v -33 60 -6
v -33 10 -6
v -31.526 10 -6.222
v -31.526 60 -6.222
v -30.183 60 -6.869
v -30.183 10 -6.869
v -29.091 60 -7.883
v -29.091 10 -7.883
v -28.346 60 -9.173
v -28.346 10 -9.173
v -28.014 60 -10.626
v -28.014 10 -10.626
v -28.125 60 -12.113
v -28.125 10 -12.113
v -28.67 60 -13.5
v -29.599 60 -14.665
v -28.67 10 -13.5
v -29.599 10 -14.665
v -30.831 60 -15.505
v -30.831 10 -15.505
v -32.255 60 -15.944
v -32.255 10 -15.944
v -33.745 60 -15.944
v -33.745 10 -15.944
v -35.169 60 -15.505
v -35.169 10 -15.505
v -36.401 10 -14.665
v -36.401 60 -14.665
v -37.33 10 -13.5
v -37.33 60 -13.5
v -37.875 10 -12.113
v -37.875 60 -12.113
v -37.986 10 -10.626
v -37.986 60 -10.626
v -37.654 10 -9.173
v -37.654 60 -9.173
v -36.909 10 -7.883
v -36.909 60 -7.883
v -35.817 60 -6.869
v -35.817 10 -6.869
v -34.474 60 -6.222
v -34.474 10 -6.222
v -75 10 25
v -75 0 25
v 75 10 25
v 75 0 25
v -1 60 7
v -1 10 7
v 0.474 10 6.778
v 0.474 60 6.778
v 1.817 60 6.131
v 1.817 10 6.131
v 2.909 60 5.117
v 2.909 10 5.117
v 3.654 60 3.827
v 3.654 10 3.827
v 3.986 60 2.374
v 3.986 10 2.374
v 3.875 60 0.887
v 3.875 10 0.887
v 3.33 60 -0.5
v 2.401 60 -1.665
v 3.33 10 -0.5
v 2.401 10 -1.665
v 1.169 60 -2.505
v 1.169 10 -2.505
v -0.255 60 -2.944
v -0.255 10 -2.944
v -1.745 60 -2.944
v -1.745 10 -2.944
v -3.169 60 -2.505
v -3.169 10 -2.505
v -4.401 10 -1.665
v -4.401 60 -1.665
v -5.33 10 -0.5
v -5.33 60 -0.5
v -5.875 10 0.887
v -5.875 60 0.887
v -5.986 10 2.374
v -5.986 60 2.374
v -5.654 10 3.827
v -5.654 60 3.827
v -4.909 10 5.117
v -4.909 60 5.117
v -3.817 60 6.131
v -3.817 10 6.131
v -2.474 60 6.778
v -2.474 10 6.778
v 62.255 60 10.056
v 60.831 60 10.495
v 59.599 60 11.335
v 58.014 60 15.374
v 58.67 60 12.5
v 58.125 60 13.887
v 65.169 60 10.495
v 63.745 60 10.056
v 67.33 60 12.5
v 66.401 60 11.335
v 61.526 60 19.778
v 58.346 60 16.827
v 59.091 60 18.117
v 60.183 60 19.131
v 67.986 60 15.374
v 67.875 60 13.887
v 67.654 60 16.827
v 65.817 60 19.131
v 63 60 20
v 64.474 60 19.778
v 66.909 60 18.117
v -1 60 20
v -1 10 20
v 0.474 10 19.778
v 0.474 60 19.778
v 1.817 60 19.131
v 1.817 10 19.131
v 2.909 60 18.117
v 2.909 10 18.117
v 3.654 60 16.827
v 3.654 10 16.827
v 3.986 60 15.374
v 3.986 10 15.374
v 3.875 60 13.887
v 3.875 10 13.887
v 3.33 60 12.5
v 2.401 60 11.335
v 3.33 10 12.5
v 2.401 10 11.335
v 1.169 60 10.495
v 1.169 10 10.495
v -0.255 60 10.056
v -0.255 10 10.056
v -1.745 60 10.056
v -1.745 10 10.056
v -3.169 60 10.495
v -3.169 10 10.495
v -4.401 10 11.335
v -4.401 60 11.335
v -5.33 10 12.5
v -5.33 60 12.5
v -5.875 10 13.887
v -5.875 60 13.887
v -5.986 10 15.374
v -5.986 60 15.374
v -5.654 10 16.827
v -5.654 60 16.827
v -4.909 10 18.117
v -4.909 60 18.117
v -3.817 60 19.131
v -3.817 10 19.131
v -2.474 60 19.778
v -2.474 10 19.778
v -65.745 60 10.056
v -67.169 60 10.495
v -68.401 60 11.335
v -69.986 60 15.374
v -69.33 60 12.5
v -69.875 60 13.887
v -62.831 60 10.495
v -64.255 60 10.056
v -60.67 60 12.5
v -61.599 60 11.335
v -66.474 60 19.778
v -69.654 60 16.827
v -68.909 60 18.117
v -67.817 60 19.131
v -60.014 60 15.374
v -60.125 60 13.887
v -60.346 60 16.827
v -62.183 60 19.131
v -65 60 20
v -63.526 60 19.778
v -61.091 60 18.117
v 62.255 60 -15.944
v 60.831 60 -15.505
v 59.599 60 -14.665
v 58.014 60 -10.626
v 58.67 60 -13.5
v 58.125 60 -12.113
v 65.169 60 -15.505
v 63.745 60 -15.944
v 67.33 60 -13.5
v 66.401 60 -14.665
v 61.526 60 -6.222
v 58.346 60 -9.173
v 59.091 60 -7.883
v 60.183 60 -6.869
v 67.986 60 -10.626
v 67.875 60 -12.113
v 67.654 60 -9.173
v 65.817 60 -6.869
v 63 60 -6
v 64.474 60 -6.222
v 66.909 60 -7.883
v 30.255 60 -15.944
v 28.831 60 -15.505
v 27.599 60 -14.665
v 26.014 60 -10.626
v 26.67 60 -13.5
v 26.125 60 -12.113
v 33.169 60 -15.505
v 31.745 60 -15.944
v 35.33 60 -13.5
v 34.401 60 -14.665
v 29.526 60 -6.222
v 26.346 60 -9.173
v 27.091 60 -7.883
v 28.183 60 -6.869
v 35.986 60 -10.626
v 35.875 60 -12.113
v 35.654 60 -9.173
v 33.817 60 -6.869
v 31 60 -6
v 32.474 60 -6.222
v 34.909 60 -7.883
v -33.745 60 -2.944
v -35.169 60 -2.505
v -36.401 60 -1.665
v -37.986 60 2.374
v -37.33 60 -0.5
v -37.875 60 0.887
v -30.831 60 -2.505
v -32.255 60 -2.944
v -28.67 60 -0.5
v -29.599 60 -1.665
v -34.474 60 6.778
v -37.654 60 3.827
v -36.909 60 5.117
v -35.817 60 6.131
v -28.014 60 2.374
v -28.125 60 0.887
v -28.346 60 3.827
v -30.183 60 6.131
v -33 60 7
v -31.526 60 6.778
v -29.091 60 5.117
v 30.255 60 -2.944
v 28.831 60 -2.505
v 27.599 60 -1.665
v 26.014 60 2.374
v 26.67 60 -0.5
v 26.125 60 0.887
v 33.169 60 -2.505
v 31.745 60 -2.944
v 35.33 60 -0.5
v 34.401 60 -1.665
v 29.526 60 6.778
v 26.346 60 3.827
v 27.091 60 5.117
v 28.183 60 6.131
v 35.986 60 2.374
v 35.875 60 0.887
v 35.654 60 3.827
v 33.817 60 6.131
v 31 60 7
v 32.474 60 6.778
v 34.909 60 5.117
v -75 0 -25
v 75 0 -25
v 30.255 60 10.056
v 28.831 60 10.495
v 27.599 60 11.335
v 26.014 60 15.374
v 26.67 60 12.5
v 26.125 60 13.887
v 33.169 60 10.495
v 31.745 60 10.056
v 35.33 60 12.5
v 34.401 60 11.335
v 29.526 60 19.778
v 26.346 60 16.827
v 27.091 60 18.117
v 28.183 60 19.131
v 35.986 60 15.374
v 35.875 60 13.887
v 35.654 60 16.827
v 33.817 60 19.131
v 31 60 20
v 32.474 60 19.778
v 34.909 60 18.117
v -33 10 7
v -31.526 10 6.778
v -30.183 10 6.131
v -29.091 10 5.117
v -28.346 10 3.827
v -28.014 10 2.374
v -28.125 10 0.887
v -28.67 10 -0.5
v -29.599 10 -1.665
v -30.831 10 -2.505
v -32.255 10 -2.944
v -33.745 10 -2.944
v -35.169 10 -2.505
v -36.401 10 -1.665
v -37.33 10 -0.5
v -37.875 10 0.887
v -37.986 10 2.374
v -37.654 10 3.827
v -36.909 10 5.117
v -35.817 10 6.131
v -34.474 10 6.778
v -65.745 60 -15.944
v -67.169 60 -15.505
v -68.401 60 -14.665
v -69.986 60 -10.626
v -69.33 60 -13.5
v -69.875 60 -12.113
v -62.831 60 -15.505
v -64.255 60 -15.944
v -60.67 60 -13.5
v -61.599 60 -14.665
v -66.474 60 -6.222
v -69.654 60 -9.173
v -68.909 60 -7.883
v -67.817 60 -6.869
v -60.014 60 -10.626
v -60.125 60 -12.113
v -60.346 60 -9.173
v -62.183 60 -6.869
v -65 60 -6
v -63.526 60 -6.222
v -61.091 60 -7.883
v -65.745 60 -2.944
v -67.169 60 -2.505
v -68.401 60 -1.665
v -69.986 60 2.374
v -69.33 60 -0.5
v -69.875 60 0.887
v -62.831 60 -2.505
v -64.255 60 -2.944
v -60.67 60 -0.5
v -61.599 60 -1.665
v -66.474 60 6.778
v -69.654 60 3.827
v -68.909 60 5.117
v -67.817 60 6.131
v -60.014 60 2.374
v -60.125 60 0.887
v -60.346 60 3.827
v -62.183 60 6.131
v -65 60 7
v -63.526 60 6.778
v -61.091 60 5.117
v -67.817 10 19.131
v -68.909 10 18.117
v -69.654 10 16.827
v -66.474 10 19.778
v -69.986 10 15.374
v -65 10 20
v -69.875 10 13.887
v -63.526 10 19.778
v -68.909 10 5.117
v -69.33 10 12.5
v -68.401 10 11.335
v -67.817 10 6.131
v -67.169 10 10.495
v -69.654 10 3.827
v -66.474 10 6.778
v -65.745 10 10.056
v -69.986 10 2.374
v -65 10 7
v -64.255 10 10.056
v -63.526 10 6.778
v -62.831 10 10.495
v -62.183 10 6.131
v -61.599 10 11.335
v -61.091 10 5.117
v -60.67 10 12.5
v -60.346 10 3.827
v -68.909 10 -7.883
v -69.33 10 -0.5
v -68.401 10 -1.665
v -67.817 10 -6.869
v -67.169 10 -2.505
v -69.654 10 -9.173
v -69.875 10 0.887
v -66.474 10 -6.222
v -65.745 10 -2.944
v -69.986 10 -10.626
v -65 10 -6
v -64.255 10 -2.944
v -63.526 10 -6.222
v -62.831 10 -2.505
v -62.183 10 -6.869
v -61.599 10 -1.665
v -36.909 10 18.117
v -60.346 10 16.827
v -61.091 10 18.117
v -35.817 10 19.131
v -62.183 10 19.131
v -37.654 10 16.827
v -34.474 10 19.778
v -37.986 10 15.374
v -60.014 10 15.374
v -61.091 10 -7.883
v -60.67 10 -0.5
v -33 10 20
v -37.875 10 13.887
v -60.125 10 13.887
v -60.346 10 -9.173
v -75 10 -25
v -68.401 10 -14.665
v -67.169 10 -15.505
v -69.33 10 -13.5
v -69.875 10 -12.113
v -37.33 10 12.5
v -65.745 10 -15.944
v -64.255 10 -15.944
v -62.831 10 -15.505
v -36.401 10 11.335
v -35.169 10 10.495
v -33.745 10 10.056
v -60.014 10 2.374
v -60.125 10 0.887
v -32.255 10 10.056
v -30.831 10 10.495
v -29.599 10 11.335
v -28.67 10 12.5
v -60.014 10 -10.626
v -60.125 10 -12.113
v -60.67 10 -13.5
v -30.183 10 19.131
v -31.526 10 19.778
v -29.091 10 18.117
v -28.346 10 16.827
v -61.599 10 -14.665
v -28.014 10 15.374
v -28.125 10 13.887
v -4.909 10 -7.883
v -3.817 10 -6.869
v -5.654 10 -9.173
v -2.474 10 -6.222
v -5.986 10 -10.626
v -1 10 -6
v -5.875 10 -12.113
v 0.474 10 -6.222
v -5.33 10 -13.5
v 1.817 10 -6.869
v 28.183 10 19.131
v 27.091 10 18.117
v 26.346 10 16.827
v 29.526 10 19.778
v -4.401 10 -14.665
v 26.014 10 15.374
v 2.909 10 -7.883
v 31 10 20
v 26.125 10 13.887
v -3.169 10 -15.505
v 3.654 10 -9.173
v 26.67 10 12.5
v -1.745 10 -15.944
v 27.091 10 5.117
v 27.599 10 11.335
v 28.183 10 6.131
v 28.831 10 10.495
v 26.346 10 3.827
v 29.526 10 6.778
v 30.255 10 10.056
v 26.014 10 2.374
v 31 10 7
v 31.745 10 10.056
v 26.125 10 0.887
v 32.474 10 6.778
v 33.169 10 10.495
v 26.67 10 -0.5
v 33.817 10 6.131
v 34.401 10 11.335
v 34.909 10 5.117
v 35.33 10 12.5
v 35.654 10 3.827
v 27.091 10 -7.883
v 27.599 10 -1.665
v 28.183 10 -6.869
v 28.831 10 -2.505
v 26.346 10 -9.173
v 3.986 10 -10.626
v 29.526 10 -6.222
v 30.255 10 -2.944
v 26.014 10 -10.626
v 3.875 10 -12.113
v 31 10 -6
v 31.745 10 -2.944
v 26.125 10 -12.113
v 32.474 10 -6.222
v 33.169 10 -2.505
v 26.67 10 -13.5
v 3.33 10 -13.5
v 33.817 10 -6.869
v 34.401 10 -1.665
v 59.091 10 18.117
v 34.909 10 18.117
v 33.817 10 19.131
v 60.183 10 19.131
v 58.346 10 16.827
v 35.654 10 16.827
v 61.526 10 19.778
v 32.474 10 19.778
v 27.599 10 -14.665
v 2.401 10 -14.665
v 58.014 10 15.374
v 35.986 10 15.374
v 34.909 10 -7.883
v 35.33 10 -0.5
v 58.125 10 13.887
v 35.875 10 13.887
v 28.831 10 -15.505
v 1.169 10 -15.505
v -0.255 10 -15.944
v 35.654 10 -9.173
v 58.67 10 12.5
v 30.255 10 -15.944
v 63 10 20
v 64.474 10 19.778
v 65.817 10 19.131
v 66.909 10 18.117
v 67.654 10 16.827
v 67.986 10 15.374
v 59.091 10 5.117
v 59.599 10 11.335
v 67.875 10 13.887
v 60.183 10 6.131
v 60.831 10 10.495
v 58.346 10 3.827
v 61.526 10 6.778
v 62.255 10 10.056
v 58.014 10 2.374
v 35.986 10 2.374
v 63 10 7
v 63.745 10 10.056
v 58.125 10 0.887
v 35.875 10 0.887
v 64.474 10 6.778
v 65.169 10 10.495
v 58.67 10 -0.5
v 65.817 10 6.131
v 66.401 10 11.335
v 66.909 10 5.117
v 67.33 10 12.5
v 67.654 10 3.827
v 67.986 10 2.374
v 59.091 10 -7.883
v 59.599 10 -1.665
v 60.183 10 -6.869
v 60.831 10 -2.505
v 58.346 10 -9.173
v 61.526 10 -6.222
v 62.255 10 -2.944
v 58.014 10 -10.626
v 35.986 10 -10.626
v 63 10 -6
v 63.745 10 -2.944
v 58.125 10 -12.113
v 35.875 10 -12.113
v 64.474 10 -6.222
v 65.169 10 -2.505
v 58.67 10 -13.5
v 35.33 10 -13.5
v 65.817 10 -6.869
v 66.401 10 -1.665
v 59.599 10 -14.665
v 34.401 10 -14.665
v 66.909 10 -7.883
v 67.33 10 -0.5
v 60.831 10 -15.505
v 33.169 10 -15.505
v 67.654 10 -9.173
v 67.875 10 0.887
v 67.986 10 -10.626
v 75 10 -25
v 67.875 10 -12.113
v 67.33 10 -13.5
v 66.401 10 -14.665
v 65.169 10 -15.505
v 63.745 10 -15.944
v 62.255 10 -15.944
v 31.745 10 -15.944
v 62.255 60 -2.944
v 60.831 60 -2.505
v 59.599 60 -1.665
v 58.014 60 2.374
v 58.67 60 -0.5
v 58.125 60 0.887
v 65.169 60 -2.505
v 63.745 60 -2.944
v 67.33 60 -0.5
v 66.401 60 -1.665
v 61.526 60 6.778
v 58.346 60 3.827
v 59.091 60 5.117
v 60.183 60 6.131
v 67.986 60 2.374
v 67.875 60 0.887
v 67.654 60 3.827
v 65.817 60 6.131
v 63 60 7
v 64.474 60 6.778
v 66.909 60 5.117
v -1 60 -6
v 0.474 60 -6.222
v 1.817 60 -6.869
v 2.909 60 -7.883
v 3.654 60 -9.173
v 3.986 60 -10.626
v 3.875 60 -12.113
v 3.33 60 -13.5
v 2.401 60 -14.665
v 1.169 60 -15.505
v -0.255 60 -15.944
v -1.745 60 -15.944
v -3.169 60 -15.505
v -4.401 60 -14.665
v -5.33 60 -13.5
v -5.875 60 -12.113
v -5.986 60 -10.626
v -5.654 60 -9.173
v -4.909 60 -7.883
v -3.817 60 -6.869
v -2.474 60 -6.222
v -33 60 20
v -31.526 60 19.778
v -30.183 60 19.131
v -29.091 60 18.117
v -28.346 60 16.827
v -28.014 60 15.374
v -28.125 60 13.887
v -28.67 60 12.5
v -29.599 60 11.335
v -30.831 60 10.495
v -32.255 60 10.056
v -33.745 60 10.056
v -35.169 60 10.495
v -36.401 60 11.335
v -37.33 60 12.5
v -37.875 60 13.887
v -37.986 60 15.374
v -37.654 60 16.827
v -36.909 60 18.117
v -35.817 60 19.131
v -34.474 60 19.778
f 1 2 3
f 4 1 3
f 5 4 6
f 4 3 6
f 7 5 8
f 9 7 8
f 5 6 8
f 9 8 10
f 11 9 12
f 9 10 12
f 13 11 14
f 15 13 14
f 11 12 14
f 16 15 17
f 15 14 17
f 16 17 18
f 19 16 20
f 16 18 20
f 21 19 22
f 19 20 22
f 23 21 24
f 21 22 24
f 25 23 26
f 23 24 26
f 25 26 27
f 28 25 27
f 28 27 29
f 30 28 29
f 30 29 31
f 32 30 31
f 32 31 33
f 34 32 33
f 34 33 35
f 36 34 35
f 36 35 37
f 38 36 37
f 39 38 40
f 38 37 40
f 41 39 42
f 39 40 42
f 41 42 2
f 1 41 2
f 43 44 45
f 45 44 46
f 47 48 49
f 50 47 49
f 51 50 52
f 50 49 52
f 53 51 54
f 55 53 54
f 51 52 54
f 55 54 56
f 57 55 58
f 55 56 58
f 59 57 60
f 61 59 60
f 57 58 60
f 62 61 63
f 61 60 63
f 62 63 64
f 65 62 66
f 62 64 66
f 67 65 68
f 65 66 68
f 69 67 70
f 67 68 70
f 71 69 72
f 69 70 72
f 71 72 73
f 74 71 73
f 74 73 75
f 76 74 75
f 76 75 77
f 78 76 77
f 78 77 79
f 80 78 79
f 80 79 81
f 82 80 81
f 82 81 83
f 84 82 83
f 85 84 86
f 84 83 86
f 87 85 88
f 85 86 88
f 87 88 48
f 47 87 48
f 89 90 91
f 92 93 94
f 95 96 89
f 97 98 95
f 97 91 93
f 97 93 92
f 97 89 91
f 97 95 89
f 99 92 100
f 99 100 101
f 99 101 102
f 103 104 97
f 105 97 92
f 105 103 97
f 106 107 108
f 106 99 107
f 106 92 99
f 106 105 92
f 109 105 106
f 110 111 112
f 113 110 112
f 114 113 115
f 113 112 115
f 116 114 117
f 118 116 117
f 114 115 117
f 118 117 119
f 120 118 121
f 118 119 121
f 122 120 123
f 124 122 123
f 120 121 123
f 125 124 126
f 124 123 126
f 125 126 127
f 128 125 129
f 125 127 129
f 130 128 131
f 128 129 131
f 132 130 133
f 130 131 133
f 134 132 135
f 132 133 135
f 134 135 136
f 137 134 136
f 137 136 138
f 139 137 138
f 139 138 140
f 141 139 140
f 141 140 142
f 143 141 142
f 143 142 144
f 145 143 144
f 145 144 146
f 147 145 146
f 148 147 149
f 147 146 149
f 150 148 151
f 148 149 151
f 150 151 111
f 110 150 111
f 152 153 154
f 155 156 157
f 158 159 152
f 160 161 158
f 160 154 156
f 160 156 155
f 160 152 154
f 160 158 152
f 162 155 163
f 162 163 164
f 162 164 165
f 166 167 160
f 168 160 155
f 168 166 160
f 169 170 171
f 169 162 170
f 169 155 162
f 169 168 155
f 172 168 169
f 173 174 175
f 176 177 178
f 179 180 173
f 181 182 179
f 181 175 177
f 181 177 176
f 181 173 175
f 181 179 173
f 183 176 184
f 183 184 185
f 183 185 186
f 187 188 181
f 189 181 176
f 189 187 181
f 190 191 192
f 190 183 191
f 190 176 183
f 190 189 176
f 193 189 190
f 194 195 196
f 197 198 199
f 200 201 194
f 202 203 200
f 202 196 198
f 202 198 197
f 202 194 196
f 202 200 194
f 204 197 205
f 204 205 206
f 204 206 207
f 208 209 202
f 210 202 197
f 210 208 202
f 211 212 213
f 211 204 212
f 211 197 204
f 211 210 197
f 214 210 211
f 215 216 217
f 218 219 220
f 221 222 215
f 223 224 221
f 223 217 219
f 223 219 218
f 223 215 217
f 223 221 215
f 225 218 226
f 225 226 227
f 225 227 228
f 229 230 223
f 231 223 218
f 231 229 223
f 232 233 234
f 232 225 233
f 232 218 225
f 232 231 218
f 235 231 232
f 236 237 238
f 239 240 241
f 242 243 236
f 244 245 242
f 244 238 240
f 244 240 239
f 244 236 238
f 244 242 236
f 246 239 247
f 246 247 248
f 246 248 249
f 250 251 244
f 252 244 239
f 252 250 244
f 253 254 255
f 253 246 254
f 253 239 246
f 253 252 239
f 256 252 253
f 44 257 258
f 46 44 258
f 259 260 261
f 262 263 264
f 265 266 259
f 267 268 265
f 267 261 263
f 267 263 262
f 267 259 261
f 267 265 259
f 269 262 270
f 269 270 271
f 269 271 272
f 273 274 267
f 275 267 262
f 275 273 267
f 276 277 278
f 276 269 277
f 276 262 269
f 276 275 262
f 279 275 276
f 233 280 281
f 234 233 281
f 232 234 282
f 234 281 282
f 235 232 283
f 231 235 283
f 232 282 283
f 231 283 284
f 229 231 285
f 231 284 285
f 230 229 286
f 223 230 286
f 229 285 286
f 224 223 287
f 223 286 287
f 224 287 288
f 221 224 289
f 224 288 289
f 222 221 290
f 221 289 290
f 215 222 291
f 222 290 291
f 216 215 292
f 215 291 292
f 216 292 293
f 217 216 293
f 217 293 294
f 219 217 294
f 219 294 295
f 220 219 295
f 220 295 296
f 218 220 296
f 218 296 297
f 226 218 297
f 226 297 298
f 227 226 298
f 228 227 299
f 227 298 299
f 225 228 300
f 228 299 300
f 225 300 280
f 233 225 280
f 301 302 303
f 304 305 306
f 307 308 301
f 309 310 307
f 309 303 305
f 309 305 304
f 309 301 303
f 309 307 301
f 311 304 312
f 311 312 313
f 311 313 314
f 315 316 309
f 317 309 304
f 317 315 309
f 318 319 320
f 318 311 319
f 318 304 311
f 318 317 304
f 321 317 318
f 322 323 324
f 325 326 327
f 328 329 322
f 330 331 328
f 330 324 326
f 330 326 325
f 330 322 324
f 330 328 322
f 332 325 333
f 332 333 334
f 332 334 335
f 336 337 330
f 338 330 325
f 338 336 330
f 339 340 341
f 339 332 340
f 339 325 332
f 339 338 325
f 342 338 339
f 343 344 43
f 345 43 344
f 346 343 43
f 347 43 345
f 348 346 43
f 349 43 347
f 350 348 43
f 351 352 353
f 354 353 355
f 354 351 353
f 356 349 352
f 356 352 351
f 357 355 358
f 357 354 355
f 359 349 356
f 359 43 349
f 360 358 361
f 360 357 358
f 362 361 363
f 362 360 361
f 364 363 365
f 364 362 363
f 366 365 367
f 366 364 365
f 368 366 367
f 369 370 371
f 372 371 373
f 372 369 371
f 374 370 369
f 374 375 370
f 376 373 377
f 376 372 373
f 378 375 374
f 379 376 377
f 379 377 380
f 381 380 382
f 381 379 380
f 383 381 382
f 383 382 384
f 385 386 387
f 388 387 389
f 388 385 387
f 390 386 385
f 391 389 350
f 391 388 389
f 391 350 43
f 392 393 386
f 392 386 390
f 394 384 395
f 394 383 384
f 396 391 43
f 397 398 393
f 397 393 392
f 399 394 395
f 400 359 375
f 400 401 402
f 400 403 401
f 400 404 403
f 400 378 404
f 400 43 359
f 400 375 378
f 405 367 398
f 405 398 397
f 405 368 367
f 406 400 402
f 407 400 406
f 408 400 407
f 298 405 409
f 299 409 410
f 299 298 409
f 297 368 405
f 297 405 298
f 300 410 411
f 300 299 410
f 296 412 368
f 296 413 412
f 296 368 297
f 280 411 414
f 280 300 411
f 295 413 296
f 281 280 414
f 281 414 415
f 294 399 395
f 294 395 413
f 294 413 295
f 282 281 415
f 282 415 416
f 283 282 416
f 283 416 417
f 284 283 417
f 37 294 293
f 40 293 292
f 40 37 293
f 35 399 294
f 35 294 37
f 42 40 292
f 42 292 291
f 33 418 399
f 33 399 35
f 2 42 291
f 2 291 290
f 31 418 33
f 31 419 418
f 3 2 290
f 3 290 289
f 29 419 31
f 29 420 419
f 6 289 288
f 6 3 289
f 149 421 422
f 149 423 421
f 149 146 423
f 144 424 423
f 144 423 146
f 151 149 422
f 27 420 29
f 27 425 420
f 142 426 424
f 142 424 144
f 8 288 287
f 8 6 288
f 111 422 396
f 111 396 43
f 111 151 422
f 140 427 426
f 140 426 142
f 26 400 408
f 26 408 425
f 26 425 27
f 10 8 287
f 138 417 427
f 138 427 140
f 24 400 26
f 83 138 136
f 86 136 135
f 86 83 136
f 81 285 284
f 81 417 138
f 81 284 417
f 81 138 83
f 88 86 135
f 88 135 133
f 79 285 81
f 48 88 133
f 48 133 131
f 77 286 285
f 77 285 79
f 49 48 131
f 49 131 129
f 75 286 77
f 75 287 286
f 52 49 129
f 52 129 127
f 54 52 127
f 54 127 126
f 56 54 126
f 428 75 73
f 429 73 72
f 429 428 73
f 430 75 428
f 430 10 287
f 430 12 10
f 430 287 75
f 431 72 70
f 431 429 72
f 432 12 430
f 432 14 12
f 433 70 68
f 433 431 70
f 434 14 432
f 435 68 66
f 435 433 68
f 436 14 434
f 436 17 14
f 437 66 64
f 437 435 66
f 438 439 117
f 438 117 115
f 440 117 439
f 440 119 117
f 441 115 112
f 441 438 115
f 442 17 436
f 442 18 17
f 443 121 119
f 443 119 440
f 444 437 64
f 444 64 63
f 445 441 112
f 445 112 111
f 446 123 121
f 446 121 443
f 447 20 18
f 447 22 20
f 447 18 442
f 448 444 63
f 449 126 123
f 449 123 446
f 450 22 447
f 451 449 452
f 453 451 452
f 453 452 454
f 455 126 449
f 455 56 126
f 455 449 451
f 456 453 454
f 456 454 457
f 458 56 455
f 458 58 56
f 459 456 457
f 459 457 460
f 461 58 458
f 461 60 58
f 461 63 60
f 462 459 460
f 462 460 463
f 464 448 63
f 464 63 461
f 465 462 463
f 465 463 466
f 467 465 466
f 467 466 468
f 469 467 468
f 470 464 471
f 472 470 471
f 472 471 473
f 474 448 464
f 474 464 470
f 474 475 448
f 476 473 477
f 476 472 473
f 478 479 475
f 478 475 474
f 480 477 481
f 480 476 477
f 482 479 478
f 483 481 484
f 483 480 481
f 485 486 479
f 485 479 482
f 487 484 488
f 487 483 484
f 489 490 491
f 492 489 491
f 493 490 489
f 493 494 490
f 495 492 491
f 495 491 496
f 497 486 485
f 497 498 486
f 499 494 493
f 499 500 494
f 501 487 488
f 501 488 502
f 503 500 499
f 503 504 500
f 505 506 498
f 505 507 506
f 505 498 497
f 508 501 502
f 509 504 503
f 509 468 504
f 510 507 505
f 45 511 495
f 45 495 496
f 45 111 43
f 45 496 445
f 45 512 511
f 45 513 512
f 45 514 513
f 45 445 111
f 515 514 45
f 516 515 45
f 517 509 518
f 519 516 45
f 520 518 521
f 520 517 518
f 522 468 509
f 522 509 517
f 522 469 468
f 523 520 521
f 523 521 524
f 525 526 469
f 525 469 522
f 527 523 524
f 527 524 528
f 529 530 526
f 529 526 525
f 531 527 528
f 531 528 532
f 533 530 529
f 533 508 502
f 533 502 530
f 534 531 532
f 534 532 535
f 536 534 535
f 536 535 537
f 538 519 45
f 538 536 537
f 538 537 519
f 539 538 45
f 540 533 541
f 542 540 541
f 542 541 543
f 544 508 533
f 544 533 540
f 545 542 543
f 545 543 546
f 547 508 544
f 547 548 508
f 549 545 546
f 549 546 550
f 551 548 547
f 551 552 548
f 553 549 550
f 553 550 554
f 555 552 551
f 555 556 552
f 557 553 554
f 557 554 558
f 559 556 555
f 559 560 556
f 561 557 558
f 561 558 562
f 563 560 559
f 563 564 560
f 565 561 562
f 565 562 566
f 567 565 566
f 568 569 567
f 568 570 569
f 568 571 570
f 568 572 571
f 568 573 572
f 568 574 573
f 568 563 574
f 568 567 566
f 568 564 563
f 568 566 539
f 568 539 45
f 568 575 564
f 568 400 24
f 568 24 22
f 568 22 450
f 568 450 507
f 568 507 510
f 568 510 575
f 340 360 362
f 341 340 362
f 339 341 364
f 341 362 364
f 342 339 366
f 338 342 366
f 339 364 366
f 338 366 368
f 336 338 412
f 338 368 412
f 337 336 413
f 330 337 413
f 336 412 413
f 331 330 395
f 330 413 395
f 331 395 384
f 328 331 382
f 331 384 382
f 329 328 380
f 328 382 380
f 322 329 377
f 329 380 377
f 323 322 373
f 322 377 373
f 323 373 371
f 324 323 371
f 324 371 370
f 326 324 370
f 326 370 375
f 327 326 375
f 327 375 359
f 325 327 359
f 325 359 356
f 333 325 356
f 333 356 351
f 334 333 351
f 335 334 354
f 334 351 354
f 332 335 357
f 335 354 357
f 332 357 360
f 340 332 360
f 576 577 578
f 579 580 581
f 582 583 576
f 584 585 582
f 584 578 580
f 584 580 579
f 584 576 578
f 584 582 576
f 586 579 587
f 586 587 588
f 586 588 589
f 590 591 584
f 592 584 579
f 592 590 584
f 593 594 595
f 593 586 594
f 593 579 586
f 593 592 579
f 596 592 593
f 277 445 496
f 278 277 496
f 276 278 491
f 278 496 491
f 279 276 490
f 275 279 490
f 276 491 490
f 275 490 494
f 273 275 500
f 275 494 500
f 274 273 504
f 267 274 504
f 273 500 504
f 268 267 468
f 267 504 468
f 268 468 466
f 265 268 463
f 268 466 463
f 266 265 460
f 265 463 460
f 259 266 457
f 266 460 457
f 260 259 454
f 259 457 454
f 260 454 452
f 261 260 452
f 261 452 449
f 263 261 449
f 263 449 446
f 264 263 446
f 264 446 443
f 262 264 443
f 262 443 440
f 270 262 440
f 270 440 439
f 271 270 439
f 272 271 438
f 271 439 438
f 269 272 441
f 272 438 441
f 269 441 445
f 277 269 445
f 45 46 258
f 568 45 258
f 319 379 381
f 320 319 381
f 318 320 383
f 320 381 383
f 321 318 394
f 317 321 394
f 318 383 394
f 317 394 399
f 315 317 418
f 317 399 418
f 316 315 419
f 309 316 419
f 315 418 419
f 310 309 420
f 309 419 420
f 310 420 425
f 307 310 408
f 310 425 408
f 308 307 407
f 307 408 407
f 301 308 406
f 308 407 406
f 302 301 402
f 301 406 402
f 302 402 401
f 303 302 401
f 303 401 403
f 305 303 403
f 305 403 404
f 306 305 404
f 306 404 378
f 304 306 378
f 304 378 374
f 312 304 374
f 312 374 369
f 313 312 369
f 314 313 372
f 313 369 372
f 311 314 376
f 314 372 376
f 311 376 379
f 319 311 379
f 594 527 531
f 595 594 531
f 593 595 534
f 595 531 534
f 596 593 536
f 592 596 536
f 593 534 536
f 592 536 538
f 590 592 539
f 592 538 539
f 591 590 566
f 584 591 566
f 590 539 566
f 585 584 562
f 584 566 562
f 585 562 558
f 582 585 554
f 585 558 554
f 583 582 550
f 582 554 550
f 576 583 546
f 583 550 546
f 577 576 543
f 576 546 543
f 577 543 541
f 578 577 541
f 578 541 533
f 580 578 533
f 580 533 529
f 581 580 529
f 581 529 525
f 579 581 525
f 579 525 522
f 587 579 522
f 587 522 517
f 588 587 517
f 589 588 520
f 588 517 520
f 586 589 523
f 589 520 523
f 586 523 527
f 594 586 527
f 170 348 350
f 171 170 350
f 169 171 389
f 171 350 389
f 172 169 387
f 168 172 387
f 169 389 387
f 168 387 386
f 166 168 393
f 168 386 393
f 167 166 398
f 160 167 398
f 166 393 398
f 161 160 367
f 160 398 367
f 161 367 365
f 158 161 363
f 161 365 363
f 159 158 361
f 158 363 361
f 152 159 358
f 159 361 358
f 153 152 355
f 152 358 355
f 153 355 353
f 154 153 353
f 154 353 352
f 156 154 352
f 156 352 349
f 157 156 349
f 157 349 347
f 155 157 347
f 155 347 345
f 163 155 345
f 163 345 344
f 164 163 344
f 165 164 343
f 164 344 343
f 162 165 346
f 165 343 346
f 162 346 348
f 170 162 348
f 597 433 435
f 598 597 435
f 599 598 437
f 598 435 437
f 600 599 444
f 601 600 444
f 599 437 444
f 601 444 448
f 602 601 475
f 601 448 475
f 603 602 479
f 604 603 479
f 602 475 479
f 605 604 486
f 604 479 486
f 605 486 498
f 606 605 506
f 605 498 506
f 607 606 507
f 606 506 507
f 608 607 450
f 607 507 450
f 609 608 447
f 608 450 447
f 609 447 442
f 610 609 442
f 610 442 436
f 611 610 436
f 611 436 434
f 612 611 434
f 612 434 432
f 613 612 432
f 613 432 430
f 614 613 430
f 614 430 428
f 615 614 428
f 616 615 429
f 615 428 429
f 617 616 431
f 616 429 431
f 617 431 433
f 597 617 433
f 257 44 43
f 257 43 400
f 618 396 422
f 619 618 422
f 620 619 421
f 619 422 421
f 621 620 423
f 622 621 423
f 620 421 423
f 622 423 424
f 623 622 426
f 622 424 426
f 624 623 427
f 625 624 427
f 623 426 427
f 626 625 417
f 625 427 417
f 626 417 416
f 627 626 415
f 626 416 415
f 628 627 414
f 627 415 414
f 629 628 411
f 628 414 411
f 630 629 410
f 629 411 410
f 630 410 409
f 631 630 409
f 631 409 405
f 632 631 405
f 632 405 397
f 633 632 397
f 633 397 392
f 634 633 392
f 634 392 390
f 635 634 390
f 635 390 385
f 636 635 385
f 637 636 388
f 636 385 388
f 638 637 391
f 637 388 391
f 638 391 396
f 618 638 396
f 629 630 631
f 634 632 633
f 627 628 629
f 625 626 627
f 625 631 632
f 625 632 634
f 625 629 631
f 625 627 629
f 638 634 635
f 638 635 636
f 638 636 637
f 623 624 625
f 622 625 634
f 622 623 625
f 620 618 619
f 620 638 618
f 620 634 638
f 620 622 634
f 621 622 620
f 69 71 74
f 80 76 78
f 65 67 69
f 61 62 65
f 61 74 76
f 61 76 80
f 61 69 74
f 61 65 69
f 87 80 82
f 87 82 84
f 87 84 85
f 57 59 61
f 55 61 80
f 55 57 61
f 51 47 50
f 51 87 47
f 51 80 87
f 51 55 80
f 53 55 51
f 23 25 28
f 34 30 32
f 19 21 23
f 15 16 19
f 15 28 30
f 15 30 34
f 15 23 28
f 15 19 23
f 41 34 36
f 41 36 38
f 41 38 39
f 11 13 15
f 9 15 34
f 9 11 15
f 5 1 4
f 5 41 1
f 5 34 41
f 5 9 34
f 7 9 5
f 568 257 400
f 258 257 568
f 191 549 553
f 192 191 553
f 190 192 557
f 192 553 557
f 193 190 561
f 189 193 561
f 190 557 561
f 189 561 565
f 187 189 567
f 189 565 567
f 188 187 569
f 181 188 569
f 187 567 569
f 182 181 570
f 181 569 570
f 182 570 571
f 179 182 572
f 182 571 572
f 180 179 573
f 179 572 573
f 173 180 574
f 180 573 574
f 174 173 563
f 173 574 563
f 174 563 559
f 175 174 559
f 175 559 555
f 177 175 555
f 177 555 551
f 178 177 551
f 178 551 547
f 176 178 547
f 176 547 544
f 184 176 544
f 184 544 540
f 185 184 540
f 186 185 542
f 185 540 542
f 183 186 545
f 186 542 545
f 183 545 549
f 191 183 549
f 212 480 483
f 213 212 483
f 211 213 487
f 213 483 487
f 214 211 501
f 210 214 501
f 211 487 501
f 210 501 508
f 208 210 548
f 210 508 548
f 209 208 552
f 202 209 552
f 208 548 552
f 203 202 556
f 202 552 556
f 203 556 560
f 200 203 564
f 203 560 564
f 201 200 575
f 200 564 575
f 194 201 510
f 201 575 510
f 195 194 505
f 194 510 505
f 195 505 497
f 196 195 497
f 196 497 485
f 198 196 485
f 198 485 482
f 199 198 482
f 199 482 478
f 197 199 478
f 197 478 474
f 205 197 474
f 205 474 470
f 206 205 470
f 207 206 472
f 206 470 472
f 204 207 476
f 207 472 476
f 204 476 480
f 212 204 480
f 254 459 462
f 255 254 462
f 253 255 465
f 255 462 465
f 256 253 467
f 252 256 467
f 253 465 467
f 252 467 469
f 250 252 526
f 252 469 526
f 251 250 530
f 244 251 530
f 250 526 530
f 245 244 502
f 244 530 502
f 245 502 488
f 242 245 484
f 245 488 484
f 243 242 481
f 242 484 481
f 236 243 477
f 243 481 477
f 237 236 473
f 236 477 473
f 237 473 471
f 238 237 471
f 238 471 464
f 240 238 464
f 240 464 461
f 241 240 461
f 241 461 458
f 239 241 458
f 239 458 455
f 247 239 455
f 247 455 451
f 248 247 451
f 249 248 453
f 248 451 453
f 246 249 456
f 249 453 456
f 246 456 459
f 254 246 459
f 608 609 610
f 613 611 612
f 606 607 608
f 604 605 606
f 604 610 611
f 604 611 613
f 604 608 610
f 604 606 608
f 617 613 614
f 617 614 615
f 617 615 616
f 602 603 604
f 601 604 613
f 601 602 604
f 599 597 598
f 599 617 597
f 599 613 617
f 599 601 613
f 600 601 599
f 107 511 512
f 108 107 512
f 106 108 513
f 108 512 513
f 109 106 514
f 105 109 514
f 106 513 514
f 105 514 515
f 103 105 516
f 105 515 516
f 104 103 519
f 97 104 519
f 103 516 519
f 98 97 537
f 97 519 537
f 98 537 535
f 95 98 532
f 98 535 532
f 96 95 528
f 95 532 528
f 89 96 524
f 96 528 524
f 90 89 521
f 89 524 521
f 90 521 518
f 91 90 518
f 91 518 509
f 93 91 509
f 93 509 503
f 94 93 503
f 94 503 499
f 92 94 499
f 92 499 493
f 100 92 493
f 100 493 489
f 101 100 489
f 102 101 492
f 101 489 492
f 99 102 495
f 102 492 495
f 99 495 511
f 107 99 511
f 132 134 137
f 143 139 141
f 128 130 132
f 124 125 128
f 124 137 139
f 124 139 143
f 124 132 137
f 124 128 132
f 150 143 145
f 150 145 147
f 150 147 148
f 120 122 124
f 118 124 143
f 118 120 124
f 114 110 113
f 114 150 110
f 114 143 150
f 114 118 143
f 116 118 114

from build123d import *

# Parameters (mm, degrees)
ESQUISSE1_W                     = 150
ESQUISSE1_H                     = 50
BOSS_EXTRU_1_DEPTH              = 10
ESQUISSE2_R                     = 5
BOSS_EXTRU_2_DEPTH              = 50
R_P_TITION_LIN_AIRE1_COUNT      = 5
R_P_TITION_LIN_AIRE1_PITCH      = 32
R_P_TITION_LIN_AIRE1_COUNT_DIR2 = 3
R_P_TITION_LIN_AIRE1_PITCH_DIR2 = 13


with BuildPart() as part:
    # Esquisse1 → Boss.-Extru.1 (new body)
    with BuildSketch(Plane(origin=(0, 0, 0), x_dir=(1, 0, 0), z_dir=(0, 1, 0))):
        Rectangle(ESQUISSE1_W, ESQUISSE1_H)
    extrude(amount=BOSS_EXTRU_1_DEPTH)

    # Esquisse2 → Boss.-Extru.2 (add)
    with BuildSketch(Plane(origin=(0, 10, 0), x_dir=(1, 0, 0), z_dir=(0, 1, 0))):
        with Locations(Location((-65, -15, 0), (0, 0, 270))):
            Circle(ESQUISSE2_R)
    boss_extru_2 = extrude(amount=BOSS_EXTRU_2_DEPTH)

    # Répétition linéaire1: Boss.-Extru.2 5 × 3
    with Locations(*[(i * R_P_TITION_LIN_AIRE1_PITCH, 0, -j * R_P_TITION_LIN_AIRE1_PITCH_DIR2) for i in range(R_P_TITION_LIN_AIRE1_COUNT) for j in range(R_P_TITION_LIN_AIRE1_COUNT_DIR2) if (i, j) != (0, 0)]):
        add(boss_extru_2)


solid = part.part
